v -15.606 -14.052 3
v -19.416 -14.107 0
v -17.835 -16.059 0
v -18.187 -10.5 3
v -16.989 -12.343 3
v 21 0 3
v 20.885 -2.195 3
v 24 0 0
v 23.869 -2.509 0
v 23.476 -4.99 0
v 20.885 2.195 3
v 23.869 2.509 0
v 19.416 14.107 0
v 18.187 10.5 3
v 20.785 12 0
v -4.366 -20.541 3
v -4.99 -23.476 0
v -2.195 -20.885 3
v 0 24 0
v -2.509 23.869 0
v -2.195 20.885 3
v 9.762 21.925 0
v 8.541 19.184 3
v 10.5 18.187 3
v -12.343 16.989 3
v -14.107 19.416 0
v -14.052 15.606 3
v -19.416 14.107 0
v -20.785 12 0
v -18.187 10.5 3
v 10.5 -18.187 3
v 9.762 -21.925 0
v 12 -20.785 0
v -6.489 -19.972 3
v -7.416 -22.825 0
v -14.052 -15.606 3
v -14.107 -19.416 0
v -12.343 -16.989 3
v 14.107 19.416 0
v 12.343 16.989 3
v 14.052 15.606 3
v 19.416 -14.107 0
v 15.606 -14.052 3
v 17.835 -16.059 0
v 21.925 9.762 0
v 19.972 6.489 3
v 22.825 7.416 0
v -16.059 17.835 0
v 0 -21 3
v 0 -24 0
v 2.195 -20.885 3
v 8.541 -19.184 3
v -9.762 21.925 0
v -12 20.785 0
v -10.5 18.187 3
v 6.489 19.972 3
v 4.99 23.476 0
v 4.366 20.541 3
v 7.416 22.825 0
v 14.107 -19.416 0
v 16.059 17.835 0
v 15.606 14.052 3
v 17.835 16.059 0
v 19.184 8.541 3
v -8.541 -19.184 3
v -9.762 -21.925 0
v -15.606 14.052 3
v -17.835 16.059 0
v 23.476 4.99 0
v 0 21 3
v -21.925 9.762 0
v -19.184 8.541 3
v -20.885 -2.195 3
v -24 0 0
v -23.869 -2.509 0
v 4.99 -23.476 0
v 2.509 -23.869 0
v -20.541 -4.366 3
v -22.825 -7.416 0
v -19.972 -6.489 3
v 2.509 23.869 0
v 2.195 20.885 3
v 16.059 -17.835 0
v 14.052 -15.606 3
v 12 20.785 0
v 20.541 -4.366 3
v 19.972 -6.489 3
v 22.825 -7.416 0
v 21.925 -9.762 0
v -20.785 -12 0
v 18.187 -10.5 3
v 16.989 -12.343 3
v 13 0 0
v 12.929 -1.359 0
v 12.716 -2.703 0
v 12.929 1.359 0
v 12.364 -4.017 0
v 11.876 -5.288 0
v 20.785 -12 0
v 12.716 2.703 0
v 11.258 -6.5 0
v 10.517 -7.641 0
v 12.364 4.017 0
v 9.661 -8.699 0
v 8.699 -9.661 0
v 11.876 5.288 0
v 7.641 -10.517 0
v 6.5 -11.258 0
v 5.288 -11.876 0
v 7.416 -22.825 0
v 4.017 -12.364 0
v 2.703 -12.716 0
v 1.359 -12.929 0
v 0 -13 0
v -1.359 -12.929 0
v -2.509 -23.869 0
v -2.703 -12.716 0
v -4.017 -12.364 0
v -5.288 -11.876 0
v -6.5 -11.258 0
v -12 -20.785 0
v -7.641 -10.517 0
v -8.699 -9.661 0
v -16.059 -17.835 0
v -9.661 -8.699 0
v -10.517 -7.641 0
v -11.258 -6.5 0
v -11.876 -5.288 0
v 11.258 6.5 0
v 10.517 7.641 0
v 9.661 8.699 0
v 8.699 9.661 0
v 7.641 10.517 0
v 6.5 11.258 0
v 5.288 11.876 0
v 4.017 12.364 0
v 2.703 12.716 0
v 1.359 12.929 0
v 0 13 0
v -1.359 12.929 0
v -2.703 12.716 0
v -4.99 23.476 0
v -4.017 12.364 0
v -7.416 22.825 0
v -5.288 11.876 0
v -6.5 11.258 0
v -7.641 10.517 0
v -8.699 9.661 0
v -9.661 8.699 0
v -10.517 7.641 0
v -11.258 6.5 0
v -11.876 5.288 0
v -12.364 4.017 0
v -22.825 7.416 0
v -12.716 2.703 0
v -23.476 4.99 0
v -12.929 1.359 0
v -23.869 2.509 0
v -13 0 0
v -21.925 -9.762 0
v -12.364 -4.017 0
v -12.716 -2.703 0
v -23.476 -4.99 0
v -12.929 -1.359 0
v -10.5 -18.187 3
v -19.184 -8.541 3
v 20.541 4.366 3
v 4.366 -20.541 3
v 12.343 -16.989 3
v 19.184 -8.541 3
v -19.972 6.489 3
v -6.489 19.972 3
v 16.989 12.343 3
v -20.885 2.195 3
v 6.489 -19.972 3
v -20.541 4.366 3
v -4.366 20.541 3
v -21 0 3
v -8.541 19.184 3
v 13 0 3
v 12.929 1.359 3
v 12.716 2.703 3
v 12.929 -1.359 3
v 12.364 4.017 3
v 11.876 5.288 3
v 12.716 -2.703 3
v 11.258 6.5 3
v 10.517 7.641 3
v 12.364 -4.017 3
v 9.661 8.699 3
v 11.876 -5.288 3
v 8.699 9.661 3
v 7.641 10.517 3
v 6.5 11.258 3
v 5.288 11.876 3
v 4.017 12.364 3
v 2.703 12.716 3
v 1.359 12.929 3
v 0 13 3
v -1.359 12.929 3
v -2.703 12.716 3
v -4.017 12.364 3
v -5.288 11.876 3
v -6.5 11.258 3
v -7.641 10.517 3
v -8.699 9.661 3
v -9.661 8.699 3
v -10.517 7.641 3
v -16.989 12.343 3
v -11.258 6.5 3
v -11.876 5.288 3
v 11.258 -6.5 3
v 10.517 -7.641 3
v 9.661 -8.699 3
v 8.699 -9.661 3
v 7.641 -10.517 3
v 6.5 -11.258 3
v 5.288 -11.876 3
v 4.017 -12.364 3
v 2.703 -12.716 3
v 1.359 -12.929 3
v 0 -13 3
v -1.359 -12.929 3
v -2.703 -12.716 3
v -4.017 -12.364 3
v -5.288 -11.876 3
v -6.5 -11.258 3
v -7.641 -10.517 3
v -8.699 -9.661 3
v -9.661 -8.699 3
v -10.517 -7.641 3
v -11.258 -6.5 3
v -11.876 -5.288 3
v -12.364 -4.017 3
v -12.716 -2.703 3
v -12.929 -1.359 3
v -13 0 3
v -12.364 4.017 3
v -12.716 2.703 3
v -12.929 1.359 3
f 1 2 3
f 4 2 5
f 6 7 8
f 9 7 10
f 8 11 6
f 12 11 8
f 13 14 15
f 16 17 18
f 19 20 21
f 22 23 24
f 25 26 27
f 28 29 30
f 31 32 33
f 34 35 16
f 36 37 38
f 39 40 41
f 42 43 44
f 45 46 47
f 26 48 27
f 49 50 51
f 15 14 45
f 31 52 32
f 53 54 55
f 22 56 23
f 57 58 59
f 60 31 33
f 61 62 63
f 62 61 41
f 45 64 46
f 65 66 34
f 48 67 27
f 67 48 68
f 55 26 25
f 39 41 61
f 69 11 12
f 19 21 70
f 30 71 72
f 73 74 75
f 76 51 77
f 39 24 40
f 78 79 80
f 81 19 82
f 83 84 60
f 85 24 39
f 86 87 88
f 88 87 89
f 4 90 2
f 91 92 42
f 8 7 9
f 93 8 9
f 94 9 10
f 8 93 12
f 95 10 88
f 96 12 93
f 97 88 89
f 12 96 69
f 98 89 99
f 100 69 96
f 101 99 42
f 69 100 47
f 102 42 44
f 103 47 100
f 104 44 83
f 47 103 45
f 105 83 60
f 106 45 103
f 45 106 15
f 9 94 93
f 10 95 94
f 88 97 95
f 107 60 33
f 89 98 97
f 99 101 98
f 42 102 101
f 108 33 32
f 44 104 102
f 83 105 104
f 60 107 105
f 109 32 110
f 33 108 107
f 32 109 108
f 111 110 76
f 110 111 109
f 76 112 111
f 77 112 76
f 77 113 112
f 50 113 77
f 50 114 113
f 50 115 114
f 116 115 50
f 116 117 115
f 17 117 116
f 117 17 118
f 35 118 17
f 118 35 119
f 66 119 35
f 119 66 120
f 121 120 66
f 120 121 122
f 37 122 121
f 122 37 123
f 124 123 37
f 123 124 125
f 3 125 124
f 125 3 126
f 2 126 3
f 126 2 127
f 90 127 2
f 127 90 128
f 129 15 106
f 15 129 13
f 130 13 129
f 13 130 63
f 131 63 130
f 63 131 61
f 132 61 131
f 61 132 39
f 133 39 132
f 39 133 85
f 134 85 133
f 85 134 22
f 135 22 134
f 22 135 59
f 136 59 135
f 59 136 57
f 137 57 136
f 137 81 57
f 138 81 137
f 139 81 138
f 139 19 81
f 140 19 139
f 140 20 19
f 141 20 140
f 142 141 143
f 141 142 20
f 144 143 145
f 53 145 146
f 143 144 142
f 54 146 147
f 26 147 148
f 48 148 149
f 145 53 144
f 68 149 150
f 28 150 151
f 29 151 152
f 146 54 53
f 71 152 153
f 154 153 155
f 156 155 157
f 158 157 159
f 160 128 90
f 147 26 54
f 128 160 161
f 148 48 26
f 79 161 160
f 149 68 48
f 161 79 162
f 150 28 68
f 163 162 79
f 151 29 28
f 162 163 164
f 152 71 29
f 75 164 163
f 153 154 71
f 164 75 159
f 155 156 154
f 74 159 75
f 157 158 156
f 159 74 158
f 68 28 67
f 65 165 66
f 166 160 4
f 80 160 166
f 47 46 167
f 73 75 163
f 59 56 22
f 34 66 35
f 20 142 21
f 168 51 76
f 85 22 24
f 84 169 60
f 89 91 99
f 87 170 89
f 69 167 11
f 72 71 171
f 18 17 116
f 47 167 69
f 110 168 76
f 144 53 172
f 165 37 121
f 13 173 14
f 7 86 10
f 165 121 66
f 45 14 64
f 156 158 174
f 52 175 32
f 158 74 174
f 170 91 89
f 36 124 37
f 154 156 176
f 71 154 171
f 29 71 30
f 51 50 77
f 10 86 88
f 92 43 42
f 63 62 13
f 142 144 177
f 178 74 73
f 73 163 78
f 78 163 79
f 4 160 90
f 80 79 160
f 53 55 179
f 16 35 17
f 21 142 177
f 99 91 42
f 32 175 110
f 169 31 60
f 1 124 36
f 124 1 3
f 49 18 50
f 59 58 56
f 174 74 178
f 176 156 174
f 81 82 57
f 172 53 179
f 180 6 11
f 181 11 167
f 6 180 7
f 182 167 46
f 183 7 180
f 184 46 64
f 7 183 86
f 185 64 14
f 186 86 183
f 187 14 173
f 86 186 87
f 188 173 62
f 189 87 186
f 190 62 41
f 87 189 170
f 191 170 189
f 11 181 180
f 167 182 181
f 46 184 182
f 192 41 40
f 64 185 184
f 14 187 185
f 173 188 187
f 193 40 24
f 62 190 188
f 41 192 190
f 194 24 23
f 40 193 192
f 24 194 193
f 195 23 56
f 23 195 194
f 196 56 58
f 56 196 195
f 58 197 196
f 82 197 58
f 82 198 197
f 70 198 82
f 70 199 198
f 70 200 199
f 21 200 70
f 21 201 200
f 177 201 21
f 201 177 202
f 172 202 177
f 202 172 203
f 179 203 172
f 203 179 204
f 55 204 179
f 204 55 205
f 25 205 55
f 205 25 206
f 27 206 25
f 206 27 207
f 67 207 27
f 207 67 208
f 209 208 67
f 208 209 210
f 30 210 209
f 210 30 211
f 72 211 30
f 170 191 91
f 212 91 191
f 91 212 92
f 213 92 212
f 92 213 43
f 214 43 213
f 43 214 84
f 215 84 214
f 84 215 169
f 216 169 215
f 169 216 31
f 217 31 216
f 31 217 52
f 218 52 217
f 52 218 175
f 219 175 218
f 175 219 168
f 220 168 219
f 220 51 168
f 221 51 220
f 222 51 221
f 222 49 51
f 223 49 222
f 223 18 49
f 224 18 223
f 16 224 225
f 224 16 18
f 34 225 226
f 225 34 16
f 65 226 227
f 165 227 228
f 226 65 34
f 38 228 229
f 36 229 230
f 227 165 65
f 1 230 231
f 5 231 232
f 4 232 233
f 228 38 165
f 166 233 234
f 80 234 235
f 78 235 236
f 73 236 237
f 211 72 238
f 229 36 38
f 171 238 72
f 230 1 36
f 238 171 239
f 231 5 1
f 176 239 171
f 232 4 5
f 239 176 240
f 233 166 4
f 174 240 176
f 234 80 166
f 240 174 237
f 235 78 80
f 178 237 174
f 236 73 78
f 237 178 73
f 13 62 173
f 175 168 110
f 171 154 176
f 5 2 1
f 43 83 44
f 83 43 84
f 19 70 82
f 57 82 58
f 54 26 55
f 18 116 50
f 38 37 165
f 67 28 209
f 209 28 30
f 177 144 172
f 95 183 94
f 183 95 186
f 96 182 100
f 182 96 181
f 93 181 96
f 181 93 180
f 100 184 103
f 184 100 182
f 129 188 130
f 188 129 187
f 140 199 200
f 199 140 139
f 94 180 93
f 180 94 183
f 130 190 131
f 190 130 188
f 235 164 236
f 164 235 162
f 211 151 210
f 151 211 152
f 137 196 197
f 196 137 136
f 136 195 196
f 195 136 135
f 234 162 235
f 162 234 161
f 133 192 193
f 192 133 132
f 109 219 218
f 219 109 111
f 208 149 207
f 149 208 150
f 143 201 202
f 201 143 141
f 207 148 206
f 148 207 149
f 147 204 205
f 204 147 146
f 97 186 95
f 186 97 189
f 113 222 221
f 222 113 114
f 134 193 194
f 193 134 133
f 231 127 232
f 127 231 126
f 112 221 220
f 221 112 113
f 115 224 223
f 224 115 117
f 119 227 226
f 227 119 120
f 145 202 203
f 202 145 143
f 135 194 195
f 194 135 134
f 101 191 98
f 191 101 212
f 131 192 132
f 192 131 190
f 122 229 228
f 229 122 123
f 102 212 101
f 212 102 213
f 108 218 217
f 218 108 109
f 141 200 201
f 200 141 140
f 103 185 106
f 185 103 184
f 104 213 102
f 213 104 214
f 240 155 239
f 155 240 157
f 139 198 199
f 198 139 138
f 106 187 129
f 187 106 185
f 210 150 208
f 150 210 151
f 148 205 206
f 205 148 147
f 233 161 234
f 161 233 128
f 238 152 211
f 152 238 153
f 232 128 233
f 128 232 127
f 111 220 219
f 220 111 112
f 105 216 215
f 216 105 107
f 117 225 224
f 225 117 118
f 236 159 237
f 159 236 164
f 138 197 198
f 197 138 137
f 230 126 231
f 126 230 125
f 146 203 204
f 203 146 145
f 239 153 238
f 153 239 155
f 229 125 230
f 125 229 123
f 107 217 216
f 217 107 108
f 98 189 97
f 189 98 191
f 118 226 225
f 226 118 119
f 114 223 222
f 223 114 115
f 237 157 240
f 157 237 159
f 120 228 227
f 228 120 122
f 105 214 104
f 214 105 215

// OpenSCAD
// Conical spring washer.
$fn = 60;
eps = 0.02;
inner_d = 26;
outer_d = 48;
thickness = 3;
difference() {
    cylinder(d1=outer_d,d2=outer_d-2*thickness,h=thickness);
    translate([0,0,-eps]) cylinder(d=inner_d,h=thickness+2*eps);
}
